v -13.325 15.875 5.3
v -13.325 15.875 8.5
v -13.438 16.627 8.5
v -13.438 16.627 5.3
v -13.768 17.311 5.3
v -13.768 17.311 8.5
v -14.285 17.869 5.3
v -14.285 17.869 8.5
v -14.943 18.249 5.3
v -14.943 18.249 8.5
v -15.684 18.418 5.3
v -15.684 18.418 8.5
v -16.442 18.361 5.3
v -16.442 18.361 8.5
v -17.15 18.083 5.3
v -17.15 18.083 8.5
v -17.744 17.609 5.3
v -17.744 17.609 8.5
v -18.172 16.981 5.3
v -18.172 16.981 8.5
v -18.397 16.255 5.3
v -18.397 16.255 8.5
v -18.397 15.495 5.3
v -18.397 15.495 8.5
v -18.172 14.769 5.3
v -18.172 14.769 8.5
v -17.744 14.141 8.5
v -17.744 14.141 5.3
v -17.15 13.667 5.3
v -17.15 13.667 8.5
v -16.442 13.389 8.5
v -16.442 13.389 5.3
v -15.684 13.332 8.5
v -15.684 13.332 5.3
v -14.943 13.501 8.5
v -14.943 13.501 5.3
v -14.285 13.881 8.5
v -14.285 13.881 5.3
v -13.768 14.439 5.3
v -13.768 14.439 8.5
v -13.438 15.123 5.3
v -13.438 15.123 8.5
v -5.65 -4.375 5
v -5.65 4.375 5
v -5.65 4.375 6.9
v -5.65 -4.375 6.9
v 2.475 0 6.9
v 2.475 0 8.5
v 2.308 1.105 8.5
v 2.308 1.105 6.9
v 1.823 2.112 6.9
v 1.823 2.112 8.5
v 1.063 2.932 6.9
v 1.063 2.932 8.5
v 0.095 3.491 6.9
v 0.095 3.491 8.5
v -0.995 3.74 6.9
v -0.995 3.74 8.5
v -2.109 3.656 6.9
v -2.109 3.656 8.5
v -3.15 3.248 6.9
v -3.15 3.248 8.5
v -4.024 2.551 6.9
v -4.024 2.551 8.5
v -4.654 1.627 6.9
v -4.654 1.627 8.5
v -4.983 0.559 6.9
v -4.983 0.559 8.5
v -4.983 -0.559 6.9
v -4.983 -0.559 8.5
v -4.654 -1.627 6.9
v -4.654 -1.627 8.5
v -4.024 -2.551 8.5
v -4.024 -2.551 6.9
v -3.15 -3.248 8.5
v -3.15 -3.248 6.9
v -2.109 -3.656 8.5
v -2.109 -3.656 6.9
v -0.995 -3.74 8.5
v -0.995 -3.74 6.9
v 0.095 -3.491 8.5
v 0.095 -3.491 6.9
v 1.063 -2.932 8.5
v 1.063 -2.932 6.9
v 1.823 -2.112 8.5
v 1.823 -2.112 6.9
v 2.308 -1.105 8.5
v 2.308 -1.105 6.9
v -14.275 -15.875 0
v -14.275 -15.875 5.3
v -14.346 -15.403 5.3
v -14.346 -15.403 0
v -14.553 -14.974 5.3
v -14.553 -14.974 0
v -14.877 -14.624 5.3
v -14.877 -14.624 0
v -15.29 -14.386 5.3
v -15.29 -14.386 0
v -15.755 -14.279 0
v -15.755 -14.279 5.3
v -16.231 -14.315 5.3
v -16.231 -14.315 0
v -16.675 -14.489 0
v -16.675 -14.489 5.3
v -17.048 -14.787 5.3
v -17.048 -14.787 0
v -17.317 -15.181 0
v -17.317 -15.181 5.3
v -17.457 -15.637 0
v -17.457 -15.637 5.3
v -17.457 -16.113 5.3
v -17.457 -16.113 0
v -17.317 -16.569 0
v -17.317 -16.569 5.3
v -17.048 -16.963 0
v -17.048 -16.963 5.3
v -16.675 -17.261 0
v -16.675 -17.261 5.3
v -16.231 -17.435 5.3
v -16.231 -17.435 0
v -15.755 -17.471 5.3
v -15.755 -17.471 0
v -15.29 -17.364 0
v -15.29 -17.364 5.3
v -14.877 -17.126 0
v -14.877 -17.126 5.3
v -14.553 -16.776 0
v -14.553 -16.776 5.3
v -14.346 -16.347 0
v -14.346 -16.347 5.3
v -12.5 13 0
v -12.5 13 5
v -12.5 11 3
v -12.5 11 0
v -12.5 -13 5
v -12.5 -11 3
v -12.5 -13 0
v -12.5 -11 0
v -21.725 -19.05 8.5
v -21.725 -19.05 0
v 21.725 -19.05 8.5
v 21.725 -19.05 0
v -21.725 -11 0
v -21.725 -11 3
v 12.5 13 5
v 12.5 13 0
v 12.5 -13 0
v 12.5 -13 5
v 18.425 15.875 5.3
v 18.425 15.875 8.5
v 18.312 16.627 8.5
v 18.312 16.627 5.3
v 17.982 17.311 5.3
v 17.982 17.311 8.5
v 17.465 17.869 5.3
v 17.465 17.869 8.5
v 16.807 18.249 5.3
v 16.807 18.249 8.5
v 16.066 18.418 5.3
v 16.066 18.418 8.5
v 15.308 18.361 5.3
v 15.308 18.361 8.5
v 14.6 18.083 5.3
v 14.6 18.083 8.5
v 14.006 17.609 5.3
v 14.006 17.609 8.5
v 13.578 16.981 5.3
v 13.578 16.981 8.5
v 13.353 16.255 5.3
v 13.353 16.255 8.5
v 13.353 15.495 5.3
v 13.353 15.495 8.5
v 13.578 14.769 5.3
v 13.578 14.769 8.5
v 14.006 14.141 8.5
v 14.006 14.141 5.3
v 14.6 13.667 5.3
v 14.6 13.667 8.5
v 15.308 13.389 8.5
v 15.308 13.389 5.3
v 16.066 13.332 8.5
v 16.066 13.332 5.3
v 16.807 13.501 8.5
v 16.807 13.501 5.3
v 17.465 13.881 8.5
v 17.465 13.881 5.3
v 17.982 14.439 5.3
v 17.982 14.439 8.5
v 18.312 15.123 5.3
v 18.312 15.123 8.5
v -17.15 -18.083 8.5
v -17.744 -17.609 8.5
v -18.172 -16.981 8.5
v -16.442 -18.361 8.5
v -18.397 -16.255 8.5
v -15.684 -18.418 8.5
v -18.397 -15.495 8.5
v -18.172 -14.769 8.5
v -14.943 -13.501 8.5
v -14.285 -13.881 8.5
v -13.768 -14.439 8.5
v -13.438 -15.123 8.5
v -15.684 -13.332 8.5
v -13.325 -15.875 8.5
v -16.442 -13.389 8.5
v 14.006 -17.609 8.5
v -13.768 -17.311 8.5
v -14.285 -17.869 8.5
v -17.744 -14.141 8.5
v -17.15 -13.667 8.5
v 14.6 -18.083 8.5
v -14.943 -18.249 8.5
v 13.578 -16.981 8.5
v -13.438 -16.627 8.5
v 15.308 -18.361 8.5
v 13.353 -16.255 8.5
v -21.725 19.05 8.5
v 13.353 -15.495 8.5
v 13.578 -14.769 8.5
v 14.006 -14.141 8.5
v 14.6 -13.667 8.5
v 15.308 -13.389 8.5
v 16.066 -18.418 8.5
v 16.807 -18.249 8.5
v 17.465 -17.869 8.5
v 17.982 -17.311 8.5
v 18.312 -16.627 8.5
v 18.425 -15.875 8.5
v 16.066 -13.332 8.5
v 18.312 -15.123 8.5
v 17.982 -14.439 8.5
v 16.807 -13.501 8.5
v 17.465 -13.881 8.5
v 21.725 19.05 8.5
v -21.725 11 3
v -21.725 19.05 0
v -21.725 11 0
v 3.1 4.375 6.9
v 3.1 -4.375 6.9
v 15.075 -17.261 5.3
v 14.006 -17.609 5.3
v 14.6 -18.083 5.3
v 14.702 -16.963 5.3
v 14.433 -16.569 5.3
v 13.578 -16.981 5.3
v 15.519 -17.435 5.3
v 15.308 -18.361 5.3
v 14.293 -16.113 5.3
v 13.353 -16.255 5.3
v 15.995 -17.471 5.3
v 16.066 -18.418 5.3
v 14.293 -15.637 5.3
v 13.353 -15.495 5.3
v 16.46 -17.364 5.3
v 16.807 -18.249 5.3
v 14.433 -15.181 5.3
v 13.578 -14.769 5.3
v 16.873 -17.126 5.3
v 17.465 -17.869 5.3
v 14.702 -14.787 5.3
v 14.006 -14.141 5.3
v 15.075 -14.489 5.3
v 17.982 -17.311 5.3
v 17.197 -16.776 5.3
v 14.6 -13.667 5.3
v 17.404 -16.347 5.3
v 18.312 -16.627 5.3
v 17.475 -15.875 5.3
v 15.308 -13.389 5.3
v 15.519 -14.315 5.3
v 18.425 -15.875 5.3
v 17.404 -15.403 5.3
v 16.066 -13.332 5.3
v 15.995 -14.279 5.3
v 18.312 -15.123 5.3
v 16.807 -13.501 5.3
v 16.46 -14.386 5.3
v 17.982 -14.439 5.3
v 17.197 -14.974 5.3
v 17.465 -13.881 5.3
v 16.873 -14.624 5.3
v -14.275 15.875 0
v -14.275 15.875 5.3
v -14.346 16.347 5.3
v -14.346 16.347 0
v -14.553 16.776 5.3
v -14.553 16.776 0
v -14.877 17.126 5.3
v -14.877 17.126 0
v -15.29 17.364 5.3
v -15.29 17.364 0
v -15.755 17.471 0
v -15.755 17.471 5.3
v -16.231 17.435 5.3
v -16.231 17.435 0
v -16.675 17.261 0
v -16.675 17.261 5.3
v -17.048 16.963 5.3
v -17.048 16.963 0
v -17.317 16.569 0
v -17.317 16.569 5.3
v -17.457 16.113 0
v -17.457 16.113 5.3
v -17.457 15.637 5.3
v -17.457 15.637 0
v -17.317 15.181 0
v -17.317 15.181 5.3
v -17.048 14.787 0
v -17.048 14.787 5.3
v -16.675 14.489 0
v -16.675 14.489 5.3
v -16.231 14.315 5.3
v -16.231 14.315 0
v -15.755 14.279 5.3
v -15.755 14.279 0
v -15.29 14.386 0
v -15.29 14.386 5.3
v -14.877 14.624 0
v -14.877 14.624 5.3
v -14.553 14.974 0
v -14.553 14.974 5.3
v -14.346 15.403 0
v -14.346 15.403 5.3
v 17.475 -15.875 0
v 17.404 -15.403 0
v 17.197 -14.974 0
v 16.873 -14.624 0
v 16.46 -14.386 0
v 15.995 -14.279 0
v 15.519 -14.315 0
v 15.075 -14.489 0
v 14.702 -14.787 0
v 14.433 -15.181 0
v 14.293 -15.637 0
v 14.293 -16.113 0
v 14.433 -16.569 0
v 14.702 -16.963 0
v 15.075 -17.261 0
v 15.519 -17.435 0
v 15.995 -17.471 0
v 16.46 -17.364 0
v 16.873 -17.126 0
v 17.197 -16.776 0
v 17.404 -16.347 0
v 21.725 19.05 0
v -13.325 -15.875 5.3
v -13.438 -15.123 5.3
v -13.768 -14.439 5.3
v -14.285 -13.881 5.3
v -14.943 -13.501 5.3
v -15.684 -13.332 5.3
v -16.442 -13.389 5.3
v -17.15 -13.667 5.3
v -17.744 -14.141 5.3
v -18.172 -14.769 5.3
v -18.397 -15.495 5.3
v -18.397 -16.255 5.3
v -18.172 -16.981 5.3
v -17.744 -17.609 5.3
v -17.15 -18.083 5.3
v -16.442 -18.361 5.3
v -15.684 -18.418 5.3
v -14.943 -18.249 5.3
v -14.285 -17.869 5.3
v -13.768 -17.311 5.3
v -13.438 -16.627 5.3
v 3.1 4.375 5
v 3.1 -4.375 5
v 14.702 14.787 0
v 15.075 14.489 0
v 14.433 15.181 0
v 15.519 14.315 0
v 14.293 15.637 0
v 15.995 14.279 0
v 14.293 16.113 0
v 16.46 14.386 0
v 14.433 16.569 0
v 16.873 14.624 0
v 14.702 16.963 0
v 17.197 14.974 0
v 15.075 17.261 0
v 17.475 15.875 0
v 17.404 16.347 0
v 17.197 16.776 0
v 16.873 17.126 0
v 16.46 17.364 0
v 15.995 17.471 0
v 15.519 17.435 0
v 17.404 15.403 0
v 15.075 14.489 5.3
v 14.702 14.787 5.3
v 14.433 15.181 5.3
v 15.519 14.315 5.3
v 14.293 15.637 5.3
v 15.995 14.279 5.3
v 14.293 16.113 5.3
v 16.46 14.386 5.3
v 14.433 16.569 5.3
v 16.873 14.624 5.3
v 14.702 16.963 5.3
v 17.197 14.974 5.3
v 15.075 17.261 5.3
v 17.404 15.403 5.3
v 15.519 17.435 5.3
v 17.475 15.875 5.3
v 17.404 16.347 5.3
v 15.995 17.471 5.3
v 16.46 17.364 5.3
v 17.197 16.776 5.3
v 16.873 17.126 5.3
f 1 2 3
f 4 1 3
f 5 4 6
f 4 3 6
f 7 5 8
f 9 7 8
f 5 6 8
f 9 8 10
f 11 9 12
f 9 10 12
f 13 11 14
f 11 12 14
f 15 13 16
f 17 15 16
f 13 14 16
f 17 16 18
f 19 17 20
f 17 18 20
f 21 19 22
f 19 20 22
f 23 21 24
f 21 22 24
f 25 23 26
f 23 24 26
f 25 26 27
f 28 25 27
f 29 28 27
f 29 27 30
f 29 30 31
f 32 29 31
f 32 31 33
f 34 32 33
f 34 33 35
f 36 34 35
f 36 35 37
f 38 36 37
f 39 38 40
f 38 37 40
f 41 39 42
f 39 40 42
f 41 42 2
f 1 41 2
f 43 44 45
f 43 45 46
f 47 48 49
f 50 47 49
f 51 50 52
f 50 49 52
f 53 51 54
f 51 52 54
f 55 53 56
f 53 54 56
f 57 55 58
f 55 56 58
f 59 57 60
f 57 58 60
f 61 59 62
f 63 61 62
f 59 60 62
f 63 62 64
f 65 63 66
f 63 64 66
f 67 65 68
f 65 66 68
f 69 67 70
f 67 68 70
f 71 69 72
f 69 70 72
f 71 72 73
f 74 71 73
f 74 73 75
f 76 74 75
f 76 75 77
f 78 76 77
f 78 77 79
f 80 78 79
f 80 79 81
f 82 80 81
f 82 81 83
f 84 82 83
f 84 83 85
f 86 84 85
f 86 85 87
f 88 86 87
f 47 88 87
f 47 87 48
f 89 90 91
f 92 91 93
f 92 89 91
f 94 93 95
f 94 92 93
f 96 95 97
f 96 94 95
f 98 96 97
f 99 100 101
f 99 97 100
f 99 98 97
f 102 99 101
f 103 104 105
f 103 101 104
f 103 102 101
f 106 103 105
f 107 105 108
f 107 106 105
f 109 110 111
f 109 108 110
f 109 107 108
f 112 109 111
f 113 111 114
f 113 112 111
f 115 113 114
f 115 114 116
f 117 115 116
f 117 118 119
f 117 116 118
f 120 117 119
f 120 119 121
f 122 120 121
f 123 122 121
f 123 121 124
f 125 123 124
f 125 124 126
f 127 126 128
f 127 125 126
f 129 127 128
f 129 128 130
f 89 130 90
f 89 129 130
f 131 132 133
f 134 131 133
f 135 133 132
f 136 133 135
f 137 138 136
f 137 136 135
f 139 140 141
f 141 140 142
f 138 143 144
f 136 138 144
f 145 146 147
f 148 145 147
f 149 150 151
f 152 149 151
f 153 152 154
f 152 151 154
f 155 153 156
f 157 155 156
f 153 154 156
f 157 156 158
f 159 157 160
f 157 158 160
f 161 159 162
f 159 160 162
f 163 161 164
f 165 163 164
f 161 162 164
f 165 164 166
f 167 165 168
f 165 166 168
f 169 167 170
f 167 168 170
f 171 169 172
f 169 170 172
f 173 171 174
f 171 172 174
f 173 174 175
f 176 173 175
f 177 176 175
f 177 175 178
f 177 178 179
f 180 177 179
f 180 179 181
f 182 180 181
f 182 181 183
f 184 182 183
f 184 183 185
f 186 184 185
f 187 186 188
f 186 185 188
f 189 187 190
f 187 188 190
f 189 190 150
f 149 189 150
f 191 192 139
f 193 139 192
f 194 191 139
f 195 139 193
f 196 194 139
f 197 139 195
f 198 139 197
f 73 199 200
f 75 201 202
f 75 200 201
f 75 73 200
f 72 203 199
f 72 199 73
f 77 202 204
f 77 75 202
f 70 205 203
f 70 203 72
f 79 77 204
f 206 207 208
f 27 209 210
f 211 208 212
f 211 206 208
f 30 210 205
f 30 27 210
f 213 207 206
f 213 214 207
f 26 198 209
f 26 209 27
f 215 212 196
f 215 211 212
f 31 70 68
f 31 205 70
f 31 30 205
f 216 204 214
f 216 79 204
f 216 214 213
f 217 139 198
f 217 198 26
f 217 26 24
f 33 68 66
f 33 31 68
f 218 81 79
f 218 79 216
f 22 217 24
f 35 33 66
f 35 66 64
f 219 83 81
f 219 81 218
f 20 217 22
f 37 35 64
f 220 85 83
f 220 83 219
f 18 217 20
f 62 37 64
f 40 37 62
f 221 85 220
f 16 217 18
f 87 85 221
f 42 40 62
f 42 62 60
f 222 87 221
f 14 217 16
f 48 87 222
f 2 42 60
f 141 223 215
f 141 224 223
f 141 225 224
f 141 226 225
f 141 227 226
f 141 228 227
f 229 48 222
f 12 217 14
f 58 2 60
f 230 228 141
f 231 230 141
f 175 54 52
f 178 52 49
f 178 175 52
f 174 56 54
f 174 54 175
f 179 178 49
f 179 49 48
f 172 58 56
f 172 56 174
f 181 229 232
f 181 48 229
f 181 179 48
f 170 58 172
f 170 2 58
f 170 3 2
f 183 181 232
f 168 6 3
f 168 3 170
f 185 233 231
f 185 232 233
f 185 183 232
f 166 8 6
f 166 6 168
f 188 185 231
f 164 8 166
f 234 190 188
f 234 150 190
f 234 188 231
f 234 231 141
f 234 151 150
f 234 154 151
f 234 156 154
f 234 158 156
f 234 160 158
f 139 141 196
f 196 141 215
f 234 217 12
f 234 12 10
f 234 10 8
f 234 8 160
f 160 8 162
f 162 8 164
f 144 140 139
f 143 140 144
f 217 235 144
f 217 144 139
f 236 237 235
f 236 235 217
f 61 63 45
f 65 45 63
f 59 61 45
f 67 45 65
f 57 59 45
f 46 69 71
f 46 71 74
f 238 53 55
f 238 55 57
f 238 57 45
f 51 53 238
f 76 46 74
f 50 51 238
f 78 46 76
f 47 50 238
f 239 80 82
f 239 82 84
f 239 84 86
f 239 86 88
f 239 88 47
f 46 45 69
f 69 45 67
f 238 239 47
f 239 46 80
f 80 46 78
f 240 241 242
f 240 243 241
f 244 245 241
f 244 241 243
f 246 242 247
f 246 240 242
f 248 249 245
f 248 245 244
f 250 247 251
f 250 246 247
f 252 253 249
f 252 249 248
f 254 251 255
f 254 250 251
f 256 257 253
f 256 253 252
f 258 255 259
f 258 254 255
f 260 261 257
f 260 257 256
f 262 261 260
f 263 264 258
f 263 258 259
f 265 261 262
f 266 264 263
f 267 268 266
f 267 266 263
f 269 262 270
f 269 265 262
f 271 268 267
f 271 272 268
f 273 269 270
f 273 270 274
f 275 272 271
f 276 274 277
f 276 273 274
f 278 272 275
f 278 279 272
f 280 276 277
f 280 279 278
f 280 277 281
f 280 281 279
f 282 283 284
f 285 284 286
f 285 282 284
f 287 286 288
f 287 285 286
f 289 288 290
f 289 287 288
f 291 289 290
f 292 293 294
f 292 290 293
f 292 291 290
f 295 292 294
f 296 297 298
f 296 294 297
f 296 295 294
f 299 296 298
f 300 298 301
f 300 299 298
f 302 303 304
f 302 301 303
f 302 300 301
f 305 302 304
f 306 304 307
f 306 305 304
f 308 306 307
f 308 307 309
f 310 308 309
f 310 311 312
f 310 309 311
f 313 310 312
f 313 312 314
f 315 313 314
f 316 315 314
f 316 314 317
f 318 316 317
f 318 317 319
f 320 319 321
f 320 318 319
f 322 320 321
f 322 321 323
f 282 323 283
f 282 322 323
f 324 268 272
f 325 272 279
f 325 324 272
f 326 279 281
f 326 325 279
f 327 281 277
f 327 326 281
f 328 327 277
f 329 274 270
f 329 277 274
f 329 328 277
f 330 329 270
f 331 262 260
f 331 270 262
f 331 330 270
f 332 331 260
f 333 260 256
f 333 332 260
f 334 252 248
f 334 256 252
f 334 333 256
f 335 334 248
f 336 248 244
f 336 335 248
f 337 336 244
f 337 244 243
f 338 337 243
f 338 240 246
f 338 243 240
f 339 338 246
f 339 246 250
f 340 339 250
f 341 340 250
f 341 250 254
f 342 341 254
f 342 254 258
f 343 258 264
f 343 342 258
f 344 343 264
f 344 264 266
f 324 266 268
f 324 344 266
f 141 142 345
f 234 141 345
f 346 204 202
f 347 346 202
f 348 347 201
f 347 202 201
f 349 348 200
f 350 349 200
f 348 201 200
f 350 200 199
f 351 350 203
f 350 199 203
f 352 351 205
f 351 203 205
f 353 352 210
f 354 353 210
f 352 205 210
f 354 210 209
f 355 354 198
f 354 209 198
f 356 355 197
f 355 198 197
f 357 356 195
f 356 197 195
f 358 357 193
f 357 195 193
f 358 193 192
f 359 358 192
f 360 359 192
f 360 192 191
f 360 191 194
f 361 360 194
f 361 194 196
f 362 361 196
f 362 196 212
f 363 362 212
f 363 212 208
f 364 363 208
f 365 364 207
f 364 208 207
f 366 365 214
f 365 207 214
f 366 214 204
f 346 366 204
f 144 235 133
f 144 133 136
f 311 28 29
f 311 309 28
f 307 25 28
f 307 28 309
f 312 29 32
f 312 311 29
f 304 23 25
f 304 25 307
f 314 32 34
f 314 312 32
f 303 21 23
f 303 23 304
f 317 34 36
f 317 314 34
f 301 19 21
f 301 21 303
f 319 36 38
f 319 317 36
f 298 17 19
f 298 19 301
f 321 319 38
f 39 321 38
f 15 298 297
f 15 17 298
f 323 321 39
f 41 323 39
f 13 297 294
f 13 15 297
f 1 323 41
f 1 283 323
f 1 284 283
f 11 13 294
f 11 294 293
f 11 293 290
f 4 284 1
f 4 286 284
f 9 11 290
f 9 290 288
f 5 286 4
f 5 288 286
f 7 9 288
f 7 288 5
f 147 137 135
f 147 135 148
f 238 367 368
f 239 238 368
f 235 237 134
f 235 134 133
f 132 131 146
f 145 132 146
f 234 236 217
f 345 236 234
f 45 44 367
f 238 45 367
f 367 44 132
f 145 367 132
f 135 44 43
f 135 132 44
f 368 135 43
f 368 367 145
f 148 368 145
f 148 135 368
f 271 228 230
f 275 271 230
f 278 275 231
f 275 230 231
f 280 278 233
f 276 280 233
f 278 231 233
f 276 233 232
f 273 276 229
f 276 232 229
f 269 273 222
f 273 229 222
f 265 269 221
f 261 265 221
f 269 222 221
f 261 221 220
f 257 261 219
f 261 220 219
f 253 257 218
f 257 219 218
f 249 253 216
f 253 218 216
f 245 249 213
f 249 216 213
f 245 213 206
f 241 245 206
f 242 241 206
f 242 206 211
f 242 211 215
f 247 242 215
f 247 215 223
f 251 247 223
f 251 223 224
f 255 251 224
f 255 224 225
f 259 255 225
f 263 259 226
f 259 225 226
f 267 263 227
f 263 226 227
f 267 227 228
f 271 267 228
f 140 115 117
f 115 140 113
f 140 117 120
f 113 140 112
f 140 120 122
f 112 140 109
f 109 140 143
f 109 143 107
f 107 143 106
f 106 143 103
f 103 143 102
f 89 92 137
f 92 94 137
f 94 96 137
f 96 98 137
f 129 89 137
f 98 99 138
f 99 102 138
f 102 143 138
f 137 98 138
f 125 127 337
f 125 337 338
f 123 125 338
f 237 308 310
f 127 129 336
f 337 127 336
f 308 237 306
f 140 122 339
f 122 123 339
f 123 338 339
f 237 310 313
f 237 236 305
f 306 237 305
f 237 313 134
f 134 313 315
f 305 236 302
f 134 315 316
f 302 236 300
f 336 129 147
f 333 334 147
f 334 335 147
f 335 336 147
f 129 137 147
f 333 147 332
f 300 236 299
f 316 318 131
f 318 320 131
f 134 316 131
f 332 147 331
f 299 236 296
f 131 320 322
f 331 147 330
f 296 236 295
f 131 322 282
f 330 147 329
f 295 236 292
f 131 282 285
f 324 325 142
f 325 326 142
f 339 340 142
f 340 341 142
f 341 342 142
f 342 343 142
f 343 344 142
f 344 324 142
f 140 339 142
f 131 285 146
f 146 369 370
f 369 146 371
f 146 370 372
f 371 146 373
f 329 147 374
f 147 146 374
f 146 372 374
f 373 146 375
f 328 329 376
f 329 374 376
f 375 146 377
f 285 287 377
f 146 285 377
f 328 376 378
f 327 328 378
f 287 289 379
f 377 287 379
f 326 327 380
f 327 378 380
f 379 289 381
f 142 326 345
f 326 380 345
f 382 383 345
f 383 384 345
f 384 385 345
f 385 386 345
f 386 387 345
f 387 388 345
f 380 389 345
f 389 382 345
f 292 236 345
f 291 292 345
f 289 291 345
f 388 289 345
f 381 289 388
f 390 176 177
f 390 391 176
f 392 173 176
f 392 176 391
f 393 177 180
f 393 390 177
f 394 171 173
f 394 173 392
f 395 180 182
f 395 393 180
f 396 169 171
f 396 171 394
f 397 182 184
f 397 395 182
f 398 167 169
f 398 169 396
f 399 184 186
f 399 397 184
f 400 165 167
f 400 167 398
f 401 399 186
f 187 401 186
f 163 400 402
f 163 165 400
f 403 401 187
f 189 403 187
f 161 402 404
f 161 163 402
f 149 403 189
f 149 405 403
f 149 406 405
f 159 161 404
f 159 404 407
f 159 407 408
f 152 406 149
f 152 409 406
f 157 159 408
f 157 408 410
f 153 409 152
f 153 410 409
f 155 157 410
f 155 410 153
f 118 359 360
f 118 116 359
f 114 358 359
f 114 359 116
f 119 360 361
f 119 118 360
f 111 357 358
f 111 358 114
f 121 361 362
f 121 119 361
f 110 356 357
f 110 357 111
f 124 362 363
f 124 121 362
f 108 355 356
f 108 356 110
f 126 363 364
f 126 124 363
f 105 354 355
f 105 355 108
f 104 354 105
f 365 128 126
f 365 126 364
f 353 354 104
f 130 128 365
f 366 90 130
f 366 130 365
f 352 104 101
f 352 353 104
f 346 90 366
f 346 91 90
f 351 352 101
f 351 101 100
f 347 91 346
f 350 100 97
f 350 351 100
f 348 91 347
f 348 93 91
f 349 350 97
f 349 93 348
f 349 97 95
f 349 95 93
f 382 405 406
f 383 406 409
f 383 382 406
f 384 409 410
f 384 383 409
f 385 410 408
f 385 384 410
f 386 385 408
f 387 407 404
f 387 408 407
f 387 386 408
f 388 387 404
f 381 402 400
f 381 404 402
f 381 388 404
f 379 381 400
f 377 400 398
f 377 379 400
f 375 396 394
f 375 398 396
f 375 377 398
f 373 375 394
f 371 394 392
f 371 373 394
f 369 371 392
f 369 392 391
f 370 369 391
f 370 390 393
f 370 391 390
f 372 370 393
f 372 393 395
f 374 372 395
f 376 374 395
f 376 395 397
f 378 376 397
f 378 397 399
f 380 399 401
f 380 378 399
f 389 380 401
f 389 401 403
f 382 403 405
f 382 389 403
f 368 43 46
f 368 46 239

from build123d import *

# Parameters (mm, degrees)
F0_W      = 43.450012
F0_H      = 38.1
F0_R      = 1.6
F1_DEPTH  = 8.5
F2_R      = 2.55
F3_DEPTH  = 3.2
F4_R      = 3.75
F5_DEPTH  = 8.5
F6_W      = 8.75
F6_H      = 8.75
F7_DEPTH  = 6.9
F8_W      = 25
F8_H      = 26
F9_DEPTH  = 5
F10_W     = 22
F10_H     = 3
F11_DEPTH = 9.225006


with BuildPart() as f1:
    # F0 (on Top) → F1 (new body)
    with BuildSketch(Plane.XY):
        Rectangle(F0_W, F0_H)
        with Locations((-15.875, -15.875)):
            Circle(F0_R, mode=Mode.SUBTRACT)
        with Locations((15.875, -15.875)):
            Circle(F0_R, mode=Mode.SUBTRACT)
        with Locations((-15.875, 15.875)):
            Circle(F0_R, mode=Mode.SUBTRACT)
        with Locations((15.875, 15.875)):
            Circle(F0_R, mode=Mode.SUBTRACT)
    extrude(amount=F1_DEPTH)

    # F2 (on face) → F3 (cut)
    with BuildSketch(Plane.XY.offset(8.5)):
        with Locations((-15.875, 15.875)):
            Circle(F2_R)
        with Locations((-15.875, -15.875)):
            Circle(F2_R)
        with Locations((15.875, 15.875)):
            Circle(F2_R)
        with Locations((15.875, -15.875)):
            Circle(F2_R)
    extrude(amount=-F3_DEPTH, mode=Mode.SUBTRACT)

    # F4 (on face) → F5 (cut, through all)
    with BuildSketch(Plane.XY.offset(8.5)):
        with Locations((-1.274994, 0)):
            Circle(F4_R)
    extrude(amount=-F5_DEPTH, mode=Mode.SUBTRACT)

    # F6 (on face) → F7 (cut)
    with BuildSketch(Plane(origin=(0, 0, 0), x_dir=(1, 0, 0), z_dir=(0, 0, -1))):
        with Locations((-1.274994, 0)):
            Rectangle(F6_W, F6_H)
    extrude(amount=-F7_DEPTH, mode=Mode.SUBTRACT)

    # F8 (on face) → F9 (cut)
    with BuildSketch(Plane(origin=(0, 0, 0), x_dir=(1, 0, 0), z_dir=(0, 0, -1))):
        Rectangle(F8_W, F8_H)
    extrude(amount=-F9_DEPTH, mode=Mode.SUBTRACT)

    # F10 (on face) → F11 (cut, through all)
    with BuildSketch(Plane(origin=(-21.725006, 0, 0), x_dir=(0, -1, 0), z_dir=(-1, 0, 0))):
        with Locations((0, 1.5)):
            Rectangle(F10_W, F10_H)
    extrude(amount=-F11_DEPTH, mode=Mode.SUBTRACT)


solid = f1.part
